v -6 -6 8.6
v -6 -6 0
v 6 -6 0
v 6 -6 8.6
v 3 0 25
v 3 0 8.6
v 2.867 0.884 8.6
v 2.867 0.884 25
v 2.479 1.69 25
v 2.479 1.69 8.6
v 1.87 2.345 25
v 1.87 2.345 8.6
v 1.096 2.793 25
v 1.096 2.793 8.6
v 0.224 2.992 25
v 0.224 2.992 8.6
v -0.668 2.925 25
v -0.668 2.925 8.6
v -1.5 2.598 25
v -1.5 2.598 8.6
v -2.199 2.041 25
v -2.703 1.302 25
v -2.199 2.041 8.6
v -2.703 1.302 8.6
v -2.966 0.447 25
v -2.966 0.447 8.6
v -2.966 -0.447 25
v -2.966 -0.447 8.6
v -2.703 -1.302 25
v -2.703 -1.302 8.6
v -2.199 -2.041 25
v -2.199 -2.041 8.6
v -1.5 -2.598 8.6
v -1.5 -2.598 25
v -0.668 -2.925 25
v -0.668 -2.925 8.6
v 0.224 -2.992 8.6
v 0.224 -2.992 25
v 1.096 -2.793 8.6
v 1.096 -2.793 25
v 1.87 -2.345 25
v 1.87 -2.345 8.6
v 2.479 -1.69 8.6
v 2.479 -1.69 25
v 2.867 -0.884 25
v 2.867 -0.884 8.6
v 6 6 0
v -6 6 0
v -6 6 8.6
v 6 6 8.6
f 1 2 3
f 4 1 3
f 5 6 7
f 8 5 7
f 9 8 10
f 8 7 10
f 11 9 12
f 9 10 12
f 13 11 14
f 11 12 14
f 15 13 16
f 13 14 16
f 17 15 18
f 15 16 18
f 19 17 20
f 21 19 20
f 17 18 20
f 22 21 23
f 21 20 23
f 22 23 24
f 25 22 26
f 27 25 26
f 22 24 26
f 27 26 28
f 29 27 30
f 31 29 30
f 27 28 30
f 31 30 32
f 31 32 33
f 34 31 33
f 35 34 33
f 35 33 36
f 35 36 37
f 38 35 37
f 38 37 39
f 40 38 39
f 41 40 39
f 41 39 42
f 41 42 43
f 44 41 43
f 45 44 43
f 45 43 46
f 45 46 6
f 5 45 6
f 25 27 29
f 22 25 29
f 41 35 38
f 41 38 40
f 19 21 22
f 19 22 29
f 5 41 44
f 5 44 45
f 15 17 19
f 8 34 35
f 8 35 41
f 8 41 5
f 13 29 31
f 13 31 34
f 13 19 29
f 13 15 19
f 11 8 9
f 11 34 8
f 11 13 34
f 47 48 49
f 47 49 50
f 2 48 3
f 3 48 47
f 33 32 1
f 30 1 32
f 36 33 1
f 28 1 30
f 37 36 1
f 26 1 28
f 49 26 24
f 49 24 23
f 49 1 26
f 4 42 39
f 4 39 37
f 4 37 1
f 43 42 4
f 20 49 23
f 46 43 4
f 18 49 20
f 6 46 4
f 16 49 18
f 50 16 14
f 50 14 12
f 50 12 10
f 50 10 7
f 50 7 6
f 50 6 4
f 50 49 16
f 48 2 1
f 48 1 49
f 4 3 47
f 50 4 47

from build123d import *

# Parameters (mm, degrees)
BOX012_W          = 12
BOX012_H          = 12
BOX012_DEPTH      = 8.6
CYLINDER003_R     = 3
CYLINDER003_DEPTH = 25


with BuildPart() as part:
    # Box012 → Box012 (join)
    with BuildSketch(Plane(origin=(-6, -6, 0), x_dir=(1, 0, 0), z_dir=(0, 0, 1))):
        with Locations((6, 6)):
            Rectangle(BOX012_W, BOX012_H)
    extrude(amount=BOX012_DEPTH)

    # Cylinder003 → Cylinder003 (join)
    with BuildSketch(Plane.XY):
        Circle(CYLINDER003_R)
    extrude(amount=CYLINDER003_DEPTH)


solid = part.part
